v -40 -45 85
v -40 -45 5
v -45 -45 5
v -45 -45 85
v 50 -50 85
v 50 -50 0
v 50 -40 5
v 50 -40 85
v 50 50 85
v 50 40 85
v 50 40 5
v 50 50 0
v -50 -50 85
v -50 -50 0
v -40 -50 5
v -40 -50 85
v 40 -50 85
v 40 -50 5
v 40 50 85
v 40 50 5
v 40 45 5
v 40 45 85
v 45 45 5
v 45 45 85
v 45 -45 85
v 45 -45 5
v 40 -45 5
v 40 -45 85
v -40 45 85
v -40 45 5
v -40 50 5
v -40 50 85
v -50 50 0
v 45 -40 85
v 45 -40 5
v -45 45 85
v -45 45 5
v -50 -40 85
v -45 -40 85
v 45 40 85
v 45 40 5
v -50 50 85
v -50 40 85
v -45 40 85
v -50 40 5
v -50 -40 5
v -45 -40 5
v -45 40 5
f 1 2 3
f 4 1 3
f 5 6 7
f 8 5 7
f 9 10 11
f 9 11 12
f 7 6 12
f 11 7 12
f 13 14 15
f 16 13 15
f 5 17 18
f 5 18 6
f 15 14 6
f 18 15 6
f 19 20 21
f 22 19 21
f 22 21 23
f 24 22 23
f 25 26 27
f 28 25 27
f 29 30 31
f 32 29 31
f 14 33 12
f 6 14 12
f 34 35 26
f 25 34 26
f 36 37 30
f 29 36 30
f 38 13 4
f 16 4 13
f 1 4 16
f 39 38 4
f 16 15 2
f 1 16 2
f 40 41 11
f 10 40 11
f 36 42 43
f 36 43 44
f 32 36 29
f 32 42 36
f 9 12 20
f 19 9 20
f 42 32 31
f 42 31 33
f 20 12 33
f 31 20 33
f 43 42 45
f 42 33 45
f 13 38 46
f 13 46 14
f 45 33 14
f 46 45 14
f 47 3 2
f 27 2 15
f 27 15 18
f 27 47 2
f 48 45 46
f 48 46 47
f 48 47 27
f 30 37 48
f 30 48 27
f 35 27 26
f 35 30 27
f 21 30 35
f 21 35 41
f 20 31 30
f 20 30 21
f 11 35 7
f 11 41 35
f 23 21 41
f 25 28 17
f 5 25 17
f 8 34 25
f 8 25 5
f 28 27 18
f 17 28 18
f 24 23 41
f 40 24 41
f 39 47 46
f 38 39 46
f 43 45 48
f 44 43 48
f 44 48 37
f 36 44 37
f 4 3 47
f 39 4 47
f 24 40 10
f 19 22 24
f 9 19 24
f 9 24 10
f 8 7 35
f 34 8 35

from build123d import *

# Parameters (mm, degrees)
F0_W     = 100
F0_H     = 100
F1_DEPTH = 5
F3_DEPTH = 80


with BuildPart() as f1:
    # F0 (on Top) → F1 (new body)
    with BuildSketch(Plane.XY):
        Rectangle(F0_W, F0_H)
    extrude(amount=F1_DEPTH)

    # F2 (on face) → F3 (join)
    with BuildSketch(Plane.XY.offset(5)):
        Polygon((-40, 45), (-40, 50), (-50, 50), (-50, 40), (-45, 40), (-45, 45), align=None)
        Polygon((40, 45), (45, 45), (45, 40), (50, 40), (50, 50), (40, 50), align=None)
        Polygon((-40, -45), (-45, -45), (-45, -40), (-50, -40), (-50, -50), (-40, -50), align=None)
        Polygon((50, -40), (45, -40), (45, -45), (40, -45), (40, -50), (50, -50), align=None)
    extrude(amount=F3_DEPTH)


solid = f1.part
